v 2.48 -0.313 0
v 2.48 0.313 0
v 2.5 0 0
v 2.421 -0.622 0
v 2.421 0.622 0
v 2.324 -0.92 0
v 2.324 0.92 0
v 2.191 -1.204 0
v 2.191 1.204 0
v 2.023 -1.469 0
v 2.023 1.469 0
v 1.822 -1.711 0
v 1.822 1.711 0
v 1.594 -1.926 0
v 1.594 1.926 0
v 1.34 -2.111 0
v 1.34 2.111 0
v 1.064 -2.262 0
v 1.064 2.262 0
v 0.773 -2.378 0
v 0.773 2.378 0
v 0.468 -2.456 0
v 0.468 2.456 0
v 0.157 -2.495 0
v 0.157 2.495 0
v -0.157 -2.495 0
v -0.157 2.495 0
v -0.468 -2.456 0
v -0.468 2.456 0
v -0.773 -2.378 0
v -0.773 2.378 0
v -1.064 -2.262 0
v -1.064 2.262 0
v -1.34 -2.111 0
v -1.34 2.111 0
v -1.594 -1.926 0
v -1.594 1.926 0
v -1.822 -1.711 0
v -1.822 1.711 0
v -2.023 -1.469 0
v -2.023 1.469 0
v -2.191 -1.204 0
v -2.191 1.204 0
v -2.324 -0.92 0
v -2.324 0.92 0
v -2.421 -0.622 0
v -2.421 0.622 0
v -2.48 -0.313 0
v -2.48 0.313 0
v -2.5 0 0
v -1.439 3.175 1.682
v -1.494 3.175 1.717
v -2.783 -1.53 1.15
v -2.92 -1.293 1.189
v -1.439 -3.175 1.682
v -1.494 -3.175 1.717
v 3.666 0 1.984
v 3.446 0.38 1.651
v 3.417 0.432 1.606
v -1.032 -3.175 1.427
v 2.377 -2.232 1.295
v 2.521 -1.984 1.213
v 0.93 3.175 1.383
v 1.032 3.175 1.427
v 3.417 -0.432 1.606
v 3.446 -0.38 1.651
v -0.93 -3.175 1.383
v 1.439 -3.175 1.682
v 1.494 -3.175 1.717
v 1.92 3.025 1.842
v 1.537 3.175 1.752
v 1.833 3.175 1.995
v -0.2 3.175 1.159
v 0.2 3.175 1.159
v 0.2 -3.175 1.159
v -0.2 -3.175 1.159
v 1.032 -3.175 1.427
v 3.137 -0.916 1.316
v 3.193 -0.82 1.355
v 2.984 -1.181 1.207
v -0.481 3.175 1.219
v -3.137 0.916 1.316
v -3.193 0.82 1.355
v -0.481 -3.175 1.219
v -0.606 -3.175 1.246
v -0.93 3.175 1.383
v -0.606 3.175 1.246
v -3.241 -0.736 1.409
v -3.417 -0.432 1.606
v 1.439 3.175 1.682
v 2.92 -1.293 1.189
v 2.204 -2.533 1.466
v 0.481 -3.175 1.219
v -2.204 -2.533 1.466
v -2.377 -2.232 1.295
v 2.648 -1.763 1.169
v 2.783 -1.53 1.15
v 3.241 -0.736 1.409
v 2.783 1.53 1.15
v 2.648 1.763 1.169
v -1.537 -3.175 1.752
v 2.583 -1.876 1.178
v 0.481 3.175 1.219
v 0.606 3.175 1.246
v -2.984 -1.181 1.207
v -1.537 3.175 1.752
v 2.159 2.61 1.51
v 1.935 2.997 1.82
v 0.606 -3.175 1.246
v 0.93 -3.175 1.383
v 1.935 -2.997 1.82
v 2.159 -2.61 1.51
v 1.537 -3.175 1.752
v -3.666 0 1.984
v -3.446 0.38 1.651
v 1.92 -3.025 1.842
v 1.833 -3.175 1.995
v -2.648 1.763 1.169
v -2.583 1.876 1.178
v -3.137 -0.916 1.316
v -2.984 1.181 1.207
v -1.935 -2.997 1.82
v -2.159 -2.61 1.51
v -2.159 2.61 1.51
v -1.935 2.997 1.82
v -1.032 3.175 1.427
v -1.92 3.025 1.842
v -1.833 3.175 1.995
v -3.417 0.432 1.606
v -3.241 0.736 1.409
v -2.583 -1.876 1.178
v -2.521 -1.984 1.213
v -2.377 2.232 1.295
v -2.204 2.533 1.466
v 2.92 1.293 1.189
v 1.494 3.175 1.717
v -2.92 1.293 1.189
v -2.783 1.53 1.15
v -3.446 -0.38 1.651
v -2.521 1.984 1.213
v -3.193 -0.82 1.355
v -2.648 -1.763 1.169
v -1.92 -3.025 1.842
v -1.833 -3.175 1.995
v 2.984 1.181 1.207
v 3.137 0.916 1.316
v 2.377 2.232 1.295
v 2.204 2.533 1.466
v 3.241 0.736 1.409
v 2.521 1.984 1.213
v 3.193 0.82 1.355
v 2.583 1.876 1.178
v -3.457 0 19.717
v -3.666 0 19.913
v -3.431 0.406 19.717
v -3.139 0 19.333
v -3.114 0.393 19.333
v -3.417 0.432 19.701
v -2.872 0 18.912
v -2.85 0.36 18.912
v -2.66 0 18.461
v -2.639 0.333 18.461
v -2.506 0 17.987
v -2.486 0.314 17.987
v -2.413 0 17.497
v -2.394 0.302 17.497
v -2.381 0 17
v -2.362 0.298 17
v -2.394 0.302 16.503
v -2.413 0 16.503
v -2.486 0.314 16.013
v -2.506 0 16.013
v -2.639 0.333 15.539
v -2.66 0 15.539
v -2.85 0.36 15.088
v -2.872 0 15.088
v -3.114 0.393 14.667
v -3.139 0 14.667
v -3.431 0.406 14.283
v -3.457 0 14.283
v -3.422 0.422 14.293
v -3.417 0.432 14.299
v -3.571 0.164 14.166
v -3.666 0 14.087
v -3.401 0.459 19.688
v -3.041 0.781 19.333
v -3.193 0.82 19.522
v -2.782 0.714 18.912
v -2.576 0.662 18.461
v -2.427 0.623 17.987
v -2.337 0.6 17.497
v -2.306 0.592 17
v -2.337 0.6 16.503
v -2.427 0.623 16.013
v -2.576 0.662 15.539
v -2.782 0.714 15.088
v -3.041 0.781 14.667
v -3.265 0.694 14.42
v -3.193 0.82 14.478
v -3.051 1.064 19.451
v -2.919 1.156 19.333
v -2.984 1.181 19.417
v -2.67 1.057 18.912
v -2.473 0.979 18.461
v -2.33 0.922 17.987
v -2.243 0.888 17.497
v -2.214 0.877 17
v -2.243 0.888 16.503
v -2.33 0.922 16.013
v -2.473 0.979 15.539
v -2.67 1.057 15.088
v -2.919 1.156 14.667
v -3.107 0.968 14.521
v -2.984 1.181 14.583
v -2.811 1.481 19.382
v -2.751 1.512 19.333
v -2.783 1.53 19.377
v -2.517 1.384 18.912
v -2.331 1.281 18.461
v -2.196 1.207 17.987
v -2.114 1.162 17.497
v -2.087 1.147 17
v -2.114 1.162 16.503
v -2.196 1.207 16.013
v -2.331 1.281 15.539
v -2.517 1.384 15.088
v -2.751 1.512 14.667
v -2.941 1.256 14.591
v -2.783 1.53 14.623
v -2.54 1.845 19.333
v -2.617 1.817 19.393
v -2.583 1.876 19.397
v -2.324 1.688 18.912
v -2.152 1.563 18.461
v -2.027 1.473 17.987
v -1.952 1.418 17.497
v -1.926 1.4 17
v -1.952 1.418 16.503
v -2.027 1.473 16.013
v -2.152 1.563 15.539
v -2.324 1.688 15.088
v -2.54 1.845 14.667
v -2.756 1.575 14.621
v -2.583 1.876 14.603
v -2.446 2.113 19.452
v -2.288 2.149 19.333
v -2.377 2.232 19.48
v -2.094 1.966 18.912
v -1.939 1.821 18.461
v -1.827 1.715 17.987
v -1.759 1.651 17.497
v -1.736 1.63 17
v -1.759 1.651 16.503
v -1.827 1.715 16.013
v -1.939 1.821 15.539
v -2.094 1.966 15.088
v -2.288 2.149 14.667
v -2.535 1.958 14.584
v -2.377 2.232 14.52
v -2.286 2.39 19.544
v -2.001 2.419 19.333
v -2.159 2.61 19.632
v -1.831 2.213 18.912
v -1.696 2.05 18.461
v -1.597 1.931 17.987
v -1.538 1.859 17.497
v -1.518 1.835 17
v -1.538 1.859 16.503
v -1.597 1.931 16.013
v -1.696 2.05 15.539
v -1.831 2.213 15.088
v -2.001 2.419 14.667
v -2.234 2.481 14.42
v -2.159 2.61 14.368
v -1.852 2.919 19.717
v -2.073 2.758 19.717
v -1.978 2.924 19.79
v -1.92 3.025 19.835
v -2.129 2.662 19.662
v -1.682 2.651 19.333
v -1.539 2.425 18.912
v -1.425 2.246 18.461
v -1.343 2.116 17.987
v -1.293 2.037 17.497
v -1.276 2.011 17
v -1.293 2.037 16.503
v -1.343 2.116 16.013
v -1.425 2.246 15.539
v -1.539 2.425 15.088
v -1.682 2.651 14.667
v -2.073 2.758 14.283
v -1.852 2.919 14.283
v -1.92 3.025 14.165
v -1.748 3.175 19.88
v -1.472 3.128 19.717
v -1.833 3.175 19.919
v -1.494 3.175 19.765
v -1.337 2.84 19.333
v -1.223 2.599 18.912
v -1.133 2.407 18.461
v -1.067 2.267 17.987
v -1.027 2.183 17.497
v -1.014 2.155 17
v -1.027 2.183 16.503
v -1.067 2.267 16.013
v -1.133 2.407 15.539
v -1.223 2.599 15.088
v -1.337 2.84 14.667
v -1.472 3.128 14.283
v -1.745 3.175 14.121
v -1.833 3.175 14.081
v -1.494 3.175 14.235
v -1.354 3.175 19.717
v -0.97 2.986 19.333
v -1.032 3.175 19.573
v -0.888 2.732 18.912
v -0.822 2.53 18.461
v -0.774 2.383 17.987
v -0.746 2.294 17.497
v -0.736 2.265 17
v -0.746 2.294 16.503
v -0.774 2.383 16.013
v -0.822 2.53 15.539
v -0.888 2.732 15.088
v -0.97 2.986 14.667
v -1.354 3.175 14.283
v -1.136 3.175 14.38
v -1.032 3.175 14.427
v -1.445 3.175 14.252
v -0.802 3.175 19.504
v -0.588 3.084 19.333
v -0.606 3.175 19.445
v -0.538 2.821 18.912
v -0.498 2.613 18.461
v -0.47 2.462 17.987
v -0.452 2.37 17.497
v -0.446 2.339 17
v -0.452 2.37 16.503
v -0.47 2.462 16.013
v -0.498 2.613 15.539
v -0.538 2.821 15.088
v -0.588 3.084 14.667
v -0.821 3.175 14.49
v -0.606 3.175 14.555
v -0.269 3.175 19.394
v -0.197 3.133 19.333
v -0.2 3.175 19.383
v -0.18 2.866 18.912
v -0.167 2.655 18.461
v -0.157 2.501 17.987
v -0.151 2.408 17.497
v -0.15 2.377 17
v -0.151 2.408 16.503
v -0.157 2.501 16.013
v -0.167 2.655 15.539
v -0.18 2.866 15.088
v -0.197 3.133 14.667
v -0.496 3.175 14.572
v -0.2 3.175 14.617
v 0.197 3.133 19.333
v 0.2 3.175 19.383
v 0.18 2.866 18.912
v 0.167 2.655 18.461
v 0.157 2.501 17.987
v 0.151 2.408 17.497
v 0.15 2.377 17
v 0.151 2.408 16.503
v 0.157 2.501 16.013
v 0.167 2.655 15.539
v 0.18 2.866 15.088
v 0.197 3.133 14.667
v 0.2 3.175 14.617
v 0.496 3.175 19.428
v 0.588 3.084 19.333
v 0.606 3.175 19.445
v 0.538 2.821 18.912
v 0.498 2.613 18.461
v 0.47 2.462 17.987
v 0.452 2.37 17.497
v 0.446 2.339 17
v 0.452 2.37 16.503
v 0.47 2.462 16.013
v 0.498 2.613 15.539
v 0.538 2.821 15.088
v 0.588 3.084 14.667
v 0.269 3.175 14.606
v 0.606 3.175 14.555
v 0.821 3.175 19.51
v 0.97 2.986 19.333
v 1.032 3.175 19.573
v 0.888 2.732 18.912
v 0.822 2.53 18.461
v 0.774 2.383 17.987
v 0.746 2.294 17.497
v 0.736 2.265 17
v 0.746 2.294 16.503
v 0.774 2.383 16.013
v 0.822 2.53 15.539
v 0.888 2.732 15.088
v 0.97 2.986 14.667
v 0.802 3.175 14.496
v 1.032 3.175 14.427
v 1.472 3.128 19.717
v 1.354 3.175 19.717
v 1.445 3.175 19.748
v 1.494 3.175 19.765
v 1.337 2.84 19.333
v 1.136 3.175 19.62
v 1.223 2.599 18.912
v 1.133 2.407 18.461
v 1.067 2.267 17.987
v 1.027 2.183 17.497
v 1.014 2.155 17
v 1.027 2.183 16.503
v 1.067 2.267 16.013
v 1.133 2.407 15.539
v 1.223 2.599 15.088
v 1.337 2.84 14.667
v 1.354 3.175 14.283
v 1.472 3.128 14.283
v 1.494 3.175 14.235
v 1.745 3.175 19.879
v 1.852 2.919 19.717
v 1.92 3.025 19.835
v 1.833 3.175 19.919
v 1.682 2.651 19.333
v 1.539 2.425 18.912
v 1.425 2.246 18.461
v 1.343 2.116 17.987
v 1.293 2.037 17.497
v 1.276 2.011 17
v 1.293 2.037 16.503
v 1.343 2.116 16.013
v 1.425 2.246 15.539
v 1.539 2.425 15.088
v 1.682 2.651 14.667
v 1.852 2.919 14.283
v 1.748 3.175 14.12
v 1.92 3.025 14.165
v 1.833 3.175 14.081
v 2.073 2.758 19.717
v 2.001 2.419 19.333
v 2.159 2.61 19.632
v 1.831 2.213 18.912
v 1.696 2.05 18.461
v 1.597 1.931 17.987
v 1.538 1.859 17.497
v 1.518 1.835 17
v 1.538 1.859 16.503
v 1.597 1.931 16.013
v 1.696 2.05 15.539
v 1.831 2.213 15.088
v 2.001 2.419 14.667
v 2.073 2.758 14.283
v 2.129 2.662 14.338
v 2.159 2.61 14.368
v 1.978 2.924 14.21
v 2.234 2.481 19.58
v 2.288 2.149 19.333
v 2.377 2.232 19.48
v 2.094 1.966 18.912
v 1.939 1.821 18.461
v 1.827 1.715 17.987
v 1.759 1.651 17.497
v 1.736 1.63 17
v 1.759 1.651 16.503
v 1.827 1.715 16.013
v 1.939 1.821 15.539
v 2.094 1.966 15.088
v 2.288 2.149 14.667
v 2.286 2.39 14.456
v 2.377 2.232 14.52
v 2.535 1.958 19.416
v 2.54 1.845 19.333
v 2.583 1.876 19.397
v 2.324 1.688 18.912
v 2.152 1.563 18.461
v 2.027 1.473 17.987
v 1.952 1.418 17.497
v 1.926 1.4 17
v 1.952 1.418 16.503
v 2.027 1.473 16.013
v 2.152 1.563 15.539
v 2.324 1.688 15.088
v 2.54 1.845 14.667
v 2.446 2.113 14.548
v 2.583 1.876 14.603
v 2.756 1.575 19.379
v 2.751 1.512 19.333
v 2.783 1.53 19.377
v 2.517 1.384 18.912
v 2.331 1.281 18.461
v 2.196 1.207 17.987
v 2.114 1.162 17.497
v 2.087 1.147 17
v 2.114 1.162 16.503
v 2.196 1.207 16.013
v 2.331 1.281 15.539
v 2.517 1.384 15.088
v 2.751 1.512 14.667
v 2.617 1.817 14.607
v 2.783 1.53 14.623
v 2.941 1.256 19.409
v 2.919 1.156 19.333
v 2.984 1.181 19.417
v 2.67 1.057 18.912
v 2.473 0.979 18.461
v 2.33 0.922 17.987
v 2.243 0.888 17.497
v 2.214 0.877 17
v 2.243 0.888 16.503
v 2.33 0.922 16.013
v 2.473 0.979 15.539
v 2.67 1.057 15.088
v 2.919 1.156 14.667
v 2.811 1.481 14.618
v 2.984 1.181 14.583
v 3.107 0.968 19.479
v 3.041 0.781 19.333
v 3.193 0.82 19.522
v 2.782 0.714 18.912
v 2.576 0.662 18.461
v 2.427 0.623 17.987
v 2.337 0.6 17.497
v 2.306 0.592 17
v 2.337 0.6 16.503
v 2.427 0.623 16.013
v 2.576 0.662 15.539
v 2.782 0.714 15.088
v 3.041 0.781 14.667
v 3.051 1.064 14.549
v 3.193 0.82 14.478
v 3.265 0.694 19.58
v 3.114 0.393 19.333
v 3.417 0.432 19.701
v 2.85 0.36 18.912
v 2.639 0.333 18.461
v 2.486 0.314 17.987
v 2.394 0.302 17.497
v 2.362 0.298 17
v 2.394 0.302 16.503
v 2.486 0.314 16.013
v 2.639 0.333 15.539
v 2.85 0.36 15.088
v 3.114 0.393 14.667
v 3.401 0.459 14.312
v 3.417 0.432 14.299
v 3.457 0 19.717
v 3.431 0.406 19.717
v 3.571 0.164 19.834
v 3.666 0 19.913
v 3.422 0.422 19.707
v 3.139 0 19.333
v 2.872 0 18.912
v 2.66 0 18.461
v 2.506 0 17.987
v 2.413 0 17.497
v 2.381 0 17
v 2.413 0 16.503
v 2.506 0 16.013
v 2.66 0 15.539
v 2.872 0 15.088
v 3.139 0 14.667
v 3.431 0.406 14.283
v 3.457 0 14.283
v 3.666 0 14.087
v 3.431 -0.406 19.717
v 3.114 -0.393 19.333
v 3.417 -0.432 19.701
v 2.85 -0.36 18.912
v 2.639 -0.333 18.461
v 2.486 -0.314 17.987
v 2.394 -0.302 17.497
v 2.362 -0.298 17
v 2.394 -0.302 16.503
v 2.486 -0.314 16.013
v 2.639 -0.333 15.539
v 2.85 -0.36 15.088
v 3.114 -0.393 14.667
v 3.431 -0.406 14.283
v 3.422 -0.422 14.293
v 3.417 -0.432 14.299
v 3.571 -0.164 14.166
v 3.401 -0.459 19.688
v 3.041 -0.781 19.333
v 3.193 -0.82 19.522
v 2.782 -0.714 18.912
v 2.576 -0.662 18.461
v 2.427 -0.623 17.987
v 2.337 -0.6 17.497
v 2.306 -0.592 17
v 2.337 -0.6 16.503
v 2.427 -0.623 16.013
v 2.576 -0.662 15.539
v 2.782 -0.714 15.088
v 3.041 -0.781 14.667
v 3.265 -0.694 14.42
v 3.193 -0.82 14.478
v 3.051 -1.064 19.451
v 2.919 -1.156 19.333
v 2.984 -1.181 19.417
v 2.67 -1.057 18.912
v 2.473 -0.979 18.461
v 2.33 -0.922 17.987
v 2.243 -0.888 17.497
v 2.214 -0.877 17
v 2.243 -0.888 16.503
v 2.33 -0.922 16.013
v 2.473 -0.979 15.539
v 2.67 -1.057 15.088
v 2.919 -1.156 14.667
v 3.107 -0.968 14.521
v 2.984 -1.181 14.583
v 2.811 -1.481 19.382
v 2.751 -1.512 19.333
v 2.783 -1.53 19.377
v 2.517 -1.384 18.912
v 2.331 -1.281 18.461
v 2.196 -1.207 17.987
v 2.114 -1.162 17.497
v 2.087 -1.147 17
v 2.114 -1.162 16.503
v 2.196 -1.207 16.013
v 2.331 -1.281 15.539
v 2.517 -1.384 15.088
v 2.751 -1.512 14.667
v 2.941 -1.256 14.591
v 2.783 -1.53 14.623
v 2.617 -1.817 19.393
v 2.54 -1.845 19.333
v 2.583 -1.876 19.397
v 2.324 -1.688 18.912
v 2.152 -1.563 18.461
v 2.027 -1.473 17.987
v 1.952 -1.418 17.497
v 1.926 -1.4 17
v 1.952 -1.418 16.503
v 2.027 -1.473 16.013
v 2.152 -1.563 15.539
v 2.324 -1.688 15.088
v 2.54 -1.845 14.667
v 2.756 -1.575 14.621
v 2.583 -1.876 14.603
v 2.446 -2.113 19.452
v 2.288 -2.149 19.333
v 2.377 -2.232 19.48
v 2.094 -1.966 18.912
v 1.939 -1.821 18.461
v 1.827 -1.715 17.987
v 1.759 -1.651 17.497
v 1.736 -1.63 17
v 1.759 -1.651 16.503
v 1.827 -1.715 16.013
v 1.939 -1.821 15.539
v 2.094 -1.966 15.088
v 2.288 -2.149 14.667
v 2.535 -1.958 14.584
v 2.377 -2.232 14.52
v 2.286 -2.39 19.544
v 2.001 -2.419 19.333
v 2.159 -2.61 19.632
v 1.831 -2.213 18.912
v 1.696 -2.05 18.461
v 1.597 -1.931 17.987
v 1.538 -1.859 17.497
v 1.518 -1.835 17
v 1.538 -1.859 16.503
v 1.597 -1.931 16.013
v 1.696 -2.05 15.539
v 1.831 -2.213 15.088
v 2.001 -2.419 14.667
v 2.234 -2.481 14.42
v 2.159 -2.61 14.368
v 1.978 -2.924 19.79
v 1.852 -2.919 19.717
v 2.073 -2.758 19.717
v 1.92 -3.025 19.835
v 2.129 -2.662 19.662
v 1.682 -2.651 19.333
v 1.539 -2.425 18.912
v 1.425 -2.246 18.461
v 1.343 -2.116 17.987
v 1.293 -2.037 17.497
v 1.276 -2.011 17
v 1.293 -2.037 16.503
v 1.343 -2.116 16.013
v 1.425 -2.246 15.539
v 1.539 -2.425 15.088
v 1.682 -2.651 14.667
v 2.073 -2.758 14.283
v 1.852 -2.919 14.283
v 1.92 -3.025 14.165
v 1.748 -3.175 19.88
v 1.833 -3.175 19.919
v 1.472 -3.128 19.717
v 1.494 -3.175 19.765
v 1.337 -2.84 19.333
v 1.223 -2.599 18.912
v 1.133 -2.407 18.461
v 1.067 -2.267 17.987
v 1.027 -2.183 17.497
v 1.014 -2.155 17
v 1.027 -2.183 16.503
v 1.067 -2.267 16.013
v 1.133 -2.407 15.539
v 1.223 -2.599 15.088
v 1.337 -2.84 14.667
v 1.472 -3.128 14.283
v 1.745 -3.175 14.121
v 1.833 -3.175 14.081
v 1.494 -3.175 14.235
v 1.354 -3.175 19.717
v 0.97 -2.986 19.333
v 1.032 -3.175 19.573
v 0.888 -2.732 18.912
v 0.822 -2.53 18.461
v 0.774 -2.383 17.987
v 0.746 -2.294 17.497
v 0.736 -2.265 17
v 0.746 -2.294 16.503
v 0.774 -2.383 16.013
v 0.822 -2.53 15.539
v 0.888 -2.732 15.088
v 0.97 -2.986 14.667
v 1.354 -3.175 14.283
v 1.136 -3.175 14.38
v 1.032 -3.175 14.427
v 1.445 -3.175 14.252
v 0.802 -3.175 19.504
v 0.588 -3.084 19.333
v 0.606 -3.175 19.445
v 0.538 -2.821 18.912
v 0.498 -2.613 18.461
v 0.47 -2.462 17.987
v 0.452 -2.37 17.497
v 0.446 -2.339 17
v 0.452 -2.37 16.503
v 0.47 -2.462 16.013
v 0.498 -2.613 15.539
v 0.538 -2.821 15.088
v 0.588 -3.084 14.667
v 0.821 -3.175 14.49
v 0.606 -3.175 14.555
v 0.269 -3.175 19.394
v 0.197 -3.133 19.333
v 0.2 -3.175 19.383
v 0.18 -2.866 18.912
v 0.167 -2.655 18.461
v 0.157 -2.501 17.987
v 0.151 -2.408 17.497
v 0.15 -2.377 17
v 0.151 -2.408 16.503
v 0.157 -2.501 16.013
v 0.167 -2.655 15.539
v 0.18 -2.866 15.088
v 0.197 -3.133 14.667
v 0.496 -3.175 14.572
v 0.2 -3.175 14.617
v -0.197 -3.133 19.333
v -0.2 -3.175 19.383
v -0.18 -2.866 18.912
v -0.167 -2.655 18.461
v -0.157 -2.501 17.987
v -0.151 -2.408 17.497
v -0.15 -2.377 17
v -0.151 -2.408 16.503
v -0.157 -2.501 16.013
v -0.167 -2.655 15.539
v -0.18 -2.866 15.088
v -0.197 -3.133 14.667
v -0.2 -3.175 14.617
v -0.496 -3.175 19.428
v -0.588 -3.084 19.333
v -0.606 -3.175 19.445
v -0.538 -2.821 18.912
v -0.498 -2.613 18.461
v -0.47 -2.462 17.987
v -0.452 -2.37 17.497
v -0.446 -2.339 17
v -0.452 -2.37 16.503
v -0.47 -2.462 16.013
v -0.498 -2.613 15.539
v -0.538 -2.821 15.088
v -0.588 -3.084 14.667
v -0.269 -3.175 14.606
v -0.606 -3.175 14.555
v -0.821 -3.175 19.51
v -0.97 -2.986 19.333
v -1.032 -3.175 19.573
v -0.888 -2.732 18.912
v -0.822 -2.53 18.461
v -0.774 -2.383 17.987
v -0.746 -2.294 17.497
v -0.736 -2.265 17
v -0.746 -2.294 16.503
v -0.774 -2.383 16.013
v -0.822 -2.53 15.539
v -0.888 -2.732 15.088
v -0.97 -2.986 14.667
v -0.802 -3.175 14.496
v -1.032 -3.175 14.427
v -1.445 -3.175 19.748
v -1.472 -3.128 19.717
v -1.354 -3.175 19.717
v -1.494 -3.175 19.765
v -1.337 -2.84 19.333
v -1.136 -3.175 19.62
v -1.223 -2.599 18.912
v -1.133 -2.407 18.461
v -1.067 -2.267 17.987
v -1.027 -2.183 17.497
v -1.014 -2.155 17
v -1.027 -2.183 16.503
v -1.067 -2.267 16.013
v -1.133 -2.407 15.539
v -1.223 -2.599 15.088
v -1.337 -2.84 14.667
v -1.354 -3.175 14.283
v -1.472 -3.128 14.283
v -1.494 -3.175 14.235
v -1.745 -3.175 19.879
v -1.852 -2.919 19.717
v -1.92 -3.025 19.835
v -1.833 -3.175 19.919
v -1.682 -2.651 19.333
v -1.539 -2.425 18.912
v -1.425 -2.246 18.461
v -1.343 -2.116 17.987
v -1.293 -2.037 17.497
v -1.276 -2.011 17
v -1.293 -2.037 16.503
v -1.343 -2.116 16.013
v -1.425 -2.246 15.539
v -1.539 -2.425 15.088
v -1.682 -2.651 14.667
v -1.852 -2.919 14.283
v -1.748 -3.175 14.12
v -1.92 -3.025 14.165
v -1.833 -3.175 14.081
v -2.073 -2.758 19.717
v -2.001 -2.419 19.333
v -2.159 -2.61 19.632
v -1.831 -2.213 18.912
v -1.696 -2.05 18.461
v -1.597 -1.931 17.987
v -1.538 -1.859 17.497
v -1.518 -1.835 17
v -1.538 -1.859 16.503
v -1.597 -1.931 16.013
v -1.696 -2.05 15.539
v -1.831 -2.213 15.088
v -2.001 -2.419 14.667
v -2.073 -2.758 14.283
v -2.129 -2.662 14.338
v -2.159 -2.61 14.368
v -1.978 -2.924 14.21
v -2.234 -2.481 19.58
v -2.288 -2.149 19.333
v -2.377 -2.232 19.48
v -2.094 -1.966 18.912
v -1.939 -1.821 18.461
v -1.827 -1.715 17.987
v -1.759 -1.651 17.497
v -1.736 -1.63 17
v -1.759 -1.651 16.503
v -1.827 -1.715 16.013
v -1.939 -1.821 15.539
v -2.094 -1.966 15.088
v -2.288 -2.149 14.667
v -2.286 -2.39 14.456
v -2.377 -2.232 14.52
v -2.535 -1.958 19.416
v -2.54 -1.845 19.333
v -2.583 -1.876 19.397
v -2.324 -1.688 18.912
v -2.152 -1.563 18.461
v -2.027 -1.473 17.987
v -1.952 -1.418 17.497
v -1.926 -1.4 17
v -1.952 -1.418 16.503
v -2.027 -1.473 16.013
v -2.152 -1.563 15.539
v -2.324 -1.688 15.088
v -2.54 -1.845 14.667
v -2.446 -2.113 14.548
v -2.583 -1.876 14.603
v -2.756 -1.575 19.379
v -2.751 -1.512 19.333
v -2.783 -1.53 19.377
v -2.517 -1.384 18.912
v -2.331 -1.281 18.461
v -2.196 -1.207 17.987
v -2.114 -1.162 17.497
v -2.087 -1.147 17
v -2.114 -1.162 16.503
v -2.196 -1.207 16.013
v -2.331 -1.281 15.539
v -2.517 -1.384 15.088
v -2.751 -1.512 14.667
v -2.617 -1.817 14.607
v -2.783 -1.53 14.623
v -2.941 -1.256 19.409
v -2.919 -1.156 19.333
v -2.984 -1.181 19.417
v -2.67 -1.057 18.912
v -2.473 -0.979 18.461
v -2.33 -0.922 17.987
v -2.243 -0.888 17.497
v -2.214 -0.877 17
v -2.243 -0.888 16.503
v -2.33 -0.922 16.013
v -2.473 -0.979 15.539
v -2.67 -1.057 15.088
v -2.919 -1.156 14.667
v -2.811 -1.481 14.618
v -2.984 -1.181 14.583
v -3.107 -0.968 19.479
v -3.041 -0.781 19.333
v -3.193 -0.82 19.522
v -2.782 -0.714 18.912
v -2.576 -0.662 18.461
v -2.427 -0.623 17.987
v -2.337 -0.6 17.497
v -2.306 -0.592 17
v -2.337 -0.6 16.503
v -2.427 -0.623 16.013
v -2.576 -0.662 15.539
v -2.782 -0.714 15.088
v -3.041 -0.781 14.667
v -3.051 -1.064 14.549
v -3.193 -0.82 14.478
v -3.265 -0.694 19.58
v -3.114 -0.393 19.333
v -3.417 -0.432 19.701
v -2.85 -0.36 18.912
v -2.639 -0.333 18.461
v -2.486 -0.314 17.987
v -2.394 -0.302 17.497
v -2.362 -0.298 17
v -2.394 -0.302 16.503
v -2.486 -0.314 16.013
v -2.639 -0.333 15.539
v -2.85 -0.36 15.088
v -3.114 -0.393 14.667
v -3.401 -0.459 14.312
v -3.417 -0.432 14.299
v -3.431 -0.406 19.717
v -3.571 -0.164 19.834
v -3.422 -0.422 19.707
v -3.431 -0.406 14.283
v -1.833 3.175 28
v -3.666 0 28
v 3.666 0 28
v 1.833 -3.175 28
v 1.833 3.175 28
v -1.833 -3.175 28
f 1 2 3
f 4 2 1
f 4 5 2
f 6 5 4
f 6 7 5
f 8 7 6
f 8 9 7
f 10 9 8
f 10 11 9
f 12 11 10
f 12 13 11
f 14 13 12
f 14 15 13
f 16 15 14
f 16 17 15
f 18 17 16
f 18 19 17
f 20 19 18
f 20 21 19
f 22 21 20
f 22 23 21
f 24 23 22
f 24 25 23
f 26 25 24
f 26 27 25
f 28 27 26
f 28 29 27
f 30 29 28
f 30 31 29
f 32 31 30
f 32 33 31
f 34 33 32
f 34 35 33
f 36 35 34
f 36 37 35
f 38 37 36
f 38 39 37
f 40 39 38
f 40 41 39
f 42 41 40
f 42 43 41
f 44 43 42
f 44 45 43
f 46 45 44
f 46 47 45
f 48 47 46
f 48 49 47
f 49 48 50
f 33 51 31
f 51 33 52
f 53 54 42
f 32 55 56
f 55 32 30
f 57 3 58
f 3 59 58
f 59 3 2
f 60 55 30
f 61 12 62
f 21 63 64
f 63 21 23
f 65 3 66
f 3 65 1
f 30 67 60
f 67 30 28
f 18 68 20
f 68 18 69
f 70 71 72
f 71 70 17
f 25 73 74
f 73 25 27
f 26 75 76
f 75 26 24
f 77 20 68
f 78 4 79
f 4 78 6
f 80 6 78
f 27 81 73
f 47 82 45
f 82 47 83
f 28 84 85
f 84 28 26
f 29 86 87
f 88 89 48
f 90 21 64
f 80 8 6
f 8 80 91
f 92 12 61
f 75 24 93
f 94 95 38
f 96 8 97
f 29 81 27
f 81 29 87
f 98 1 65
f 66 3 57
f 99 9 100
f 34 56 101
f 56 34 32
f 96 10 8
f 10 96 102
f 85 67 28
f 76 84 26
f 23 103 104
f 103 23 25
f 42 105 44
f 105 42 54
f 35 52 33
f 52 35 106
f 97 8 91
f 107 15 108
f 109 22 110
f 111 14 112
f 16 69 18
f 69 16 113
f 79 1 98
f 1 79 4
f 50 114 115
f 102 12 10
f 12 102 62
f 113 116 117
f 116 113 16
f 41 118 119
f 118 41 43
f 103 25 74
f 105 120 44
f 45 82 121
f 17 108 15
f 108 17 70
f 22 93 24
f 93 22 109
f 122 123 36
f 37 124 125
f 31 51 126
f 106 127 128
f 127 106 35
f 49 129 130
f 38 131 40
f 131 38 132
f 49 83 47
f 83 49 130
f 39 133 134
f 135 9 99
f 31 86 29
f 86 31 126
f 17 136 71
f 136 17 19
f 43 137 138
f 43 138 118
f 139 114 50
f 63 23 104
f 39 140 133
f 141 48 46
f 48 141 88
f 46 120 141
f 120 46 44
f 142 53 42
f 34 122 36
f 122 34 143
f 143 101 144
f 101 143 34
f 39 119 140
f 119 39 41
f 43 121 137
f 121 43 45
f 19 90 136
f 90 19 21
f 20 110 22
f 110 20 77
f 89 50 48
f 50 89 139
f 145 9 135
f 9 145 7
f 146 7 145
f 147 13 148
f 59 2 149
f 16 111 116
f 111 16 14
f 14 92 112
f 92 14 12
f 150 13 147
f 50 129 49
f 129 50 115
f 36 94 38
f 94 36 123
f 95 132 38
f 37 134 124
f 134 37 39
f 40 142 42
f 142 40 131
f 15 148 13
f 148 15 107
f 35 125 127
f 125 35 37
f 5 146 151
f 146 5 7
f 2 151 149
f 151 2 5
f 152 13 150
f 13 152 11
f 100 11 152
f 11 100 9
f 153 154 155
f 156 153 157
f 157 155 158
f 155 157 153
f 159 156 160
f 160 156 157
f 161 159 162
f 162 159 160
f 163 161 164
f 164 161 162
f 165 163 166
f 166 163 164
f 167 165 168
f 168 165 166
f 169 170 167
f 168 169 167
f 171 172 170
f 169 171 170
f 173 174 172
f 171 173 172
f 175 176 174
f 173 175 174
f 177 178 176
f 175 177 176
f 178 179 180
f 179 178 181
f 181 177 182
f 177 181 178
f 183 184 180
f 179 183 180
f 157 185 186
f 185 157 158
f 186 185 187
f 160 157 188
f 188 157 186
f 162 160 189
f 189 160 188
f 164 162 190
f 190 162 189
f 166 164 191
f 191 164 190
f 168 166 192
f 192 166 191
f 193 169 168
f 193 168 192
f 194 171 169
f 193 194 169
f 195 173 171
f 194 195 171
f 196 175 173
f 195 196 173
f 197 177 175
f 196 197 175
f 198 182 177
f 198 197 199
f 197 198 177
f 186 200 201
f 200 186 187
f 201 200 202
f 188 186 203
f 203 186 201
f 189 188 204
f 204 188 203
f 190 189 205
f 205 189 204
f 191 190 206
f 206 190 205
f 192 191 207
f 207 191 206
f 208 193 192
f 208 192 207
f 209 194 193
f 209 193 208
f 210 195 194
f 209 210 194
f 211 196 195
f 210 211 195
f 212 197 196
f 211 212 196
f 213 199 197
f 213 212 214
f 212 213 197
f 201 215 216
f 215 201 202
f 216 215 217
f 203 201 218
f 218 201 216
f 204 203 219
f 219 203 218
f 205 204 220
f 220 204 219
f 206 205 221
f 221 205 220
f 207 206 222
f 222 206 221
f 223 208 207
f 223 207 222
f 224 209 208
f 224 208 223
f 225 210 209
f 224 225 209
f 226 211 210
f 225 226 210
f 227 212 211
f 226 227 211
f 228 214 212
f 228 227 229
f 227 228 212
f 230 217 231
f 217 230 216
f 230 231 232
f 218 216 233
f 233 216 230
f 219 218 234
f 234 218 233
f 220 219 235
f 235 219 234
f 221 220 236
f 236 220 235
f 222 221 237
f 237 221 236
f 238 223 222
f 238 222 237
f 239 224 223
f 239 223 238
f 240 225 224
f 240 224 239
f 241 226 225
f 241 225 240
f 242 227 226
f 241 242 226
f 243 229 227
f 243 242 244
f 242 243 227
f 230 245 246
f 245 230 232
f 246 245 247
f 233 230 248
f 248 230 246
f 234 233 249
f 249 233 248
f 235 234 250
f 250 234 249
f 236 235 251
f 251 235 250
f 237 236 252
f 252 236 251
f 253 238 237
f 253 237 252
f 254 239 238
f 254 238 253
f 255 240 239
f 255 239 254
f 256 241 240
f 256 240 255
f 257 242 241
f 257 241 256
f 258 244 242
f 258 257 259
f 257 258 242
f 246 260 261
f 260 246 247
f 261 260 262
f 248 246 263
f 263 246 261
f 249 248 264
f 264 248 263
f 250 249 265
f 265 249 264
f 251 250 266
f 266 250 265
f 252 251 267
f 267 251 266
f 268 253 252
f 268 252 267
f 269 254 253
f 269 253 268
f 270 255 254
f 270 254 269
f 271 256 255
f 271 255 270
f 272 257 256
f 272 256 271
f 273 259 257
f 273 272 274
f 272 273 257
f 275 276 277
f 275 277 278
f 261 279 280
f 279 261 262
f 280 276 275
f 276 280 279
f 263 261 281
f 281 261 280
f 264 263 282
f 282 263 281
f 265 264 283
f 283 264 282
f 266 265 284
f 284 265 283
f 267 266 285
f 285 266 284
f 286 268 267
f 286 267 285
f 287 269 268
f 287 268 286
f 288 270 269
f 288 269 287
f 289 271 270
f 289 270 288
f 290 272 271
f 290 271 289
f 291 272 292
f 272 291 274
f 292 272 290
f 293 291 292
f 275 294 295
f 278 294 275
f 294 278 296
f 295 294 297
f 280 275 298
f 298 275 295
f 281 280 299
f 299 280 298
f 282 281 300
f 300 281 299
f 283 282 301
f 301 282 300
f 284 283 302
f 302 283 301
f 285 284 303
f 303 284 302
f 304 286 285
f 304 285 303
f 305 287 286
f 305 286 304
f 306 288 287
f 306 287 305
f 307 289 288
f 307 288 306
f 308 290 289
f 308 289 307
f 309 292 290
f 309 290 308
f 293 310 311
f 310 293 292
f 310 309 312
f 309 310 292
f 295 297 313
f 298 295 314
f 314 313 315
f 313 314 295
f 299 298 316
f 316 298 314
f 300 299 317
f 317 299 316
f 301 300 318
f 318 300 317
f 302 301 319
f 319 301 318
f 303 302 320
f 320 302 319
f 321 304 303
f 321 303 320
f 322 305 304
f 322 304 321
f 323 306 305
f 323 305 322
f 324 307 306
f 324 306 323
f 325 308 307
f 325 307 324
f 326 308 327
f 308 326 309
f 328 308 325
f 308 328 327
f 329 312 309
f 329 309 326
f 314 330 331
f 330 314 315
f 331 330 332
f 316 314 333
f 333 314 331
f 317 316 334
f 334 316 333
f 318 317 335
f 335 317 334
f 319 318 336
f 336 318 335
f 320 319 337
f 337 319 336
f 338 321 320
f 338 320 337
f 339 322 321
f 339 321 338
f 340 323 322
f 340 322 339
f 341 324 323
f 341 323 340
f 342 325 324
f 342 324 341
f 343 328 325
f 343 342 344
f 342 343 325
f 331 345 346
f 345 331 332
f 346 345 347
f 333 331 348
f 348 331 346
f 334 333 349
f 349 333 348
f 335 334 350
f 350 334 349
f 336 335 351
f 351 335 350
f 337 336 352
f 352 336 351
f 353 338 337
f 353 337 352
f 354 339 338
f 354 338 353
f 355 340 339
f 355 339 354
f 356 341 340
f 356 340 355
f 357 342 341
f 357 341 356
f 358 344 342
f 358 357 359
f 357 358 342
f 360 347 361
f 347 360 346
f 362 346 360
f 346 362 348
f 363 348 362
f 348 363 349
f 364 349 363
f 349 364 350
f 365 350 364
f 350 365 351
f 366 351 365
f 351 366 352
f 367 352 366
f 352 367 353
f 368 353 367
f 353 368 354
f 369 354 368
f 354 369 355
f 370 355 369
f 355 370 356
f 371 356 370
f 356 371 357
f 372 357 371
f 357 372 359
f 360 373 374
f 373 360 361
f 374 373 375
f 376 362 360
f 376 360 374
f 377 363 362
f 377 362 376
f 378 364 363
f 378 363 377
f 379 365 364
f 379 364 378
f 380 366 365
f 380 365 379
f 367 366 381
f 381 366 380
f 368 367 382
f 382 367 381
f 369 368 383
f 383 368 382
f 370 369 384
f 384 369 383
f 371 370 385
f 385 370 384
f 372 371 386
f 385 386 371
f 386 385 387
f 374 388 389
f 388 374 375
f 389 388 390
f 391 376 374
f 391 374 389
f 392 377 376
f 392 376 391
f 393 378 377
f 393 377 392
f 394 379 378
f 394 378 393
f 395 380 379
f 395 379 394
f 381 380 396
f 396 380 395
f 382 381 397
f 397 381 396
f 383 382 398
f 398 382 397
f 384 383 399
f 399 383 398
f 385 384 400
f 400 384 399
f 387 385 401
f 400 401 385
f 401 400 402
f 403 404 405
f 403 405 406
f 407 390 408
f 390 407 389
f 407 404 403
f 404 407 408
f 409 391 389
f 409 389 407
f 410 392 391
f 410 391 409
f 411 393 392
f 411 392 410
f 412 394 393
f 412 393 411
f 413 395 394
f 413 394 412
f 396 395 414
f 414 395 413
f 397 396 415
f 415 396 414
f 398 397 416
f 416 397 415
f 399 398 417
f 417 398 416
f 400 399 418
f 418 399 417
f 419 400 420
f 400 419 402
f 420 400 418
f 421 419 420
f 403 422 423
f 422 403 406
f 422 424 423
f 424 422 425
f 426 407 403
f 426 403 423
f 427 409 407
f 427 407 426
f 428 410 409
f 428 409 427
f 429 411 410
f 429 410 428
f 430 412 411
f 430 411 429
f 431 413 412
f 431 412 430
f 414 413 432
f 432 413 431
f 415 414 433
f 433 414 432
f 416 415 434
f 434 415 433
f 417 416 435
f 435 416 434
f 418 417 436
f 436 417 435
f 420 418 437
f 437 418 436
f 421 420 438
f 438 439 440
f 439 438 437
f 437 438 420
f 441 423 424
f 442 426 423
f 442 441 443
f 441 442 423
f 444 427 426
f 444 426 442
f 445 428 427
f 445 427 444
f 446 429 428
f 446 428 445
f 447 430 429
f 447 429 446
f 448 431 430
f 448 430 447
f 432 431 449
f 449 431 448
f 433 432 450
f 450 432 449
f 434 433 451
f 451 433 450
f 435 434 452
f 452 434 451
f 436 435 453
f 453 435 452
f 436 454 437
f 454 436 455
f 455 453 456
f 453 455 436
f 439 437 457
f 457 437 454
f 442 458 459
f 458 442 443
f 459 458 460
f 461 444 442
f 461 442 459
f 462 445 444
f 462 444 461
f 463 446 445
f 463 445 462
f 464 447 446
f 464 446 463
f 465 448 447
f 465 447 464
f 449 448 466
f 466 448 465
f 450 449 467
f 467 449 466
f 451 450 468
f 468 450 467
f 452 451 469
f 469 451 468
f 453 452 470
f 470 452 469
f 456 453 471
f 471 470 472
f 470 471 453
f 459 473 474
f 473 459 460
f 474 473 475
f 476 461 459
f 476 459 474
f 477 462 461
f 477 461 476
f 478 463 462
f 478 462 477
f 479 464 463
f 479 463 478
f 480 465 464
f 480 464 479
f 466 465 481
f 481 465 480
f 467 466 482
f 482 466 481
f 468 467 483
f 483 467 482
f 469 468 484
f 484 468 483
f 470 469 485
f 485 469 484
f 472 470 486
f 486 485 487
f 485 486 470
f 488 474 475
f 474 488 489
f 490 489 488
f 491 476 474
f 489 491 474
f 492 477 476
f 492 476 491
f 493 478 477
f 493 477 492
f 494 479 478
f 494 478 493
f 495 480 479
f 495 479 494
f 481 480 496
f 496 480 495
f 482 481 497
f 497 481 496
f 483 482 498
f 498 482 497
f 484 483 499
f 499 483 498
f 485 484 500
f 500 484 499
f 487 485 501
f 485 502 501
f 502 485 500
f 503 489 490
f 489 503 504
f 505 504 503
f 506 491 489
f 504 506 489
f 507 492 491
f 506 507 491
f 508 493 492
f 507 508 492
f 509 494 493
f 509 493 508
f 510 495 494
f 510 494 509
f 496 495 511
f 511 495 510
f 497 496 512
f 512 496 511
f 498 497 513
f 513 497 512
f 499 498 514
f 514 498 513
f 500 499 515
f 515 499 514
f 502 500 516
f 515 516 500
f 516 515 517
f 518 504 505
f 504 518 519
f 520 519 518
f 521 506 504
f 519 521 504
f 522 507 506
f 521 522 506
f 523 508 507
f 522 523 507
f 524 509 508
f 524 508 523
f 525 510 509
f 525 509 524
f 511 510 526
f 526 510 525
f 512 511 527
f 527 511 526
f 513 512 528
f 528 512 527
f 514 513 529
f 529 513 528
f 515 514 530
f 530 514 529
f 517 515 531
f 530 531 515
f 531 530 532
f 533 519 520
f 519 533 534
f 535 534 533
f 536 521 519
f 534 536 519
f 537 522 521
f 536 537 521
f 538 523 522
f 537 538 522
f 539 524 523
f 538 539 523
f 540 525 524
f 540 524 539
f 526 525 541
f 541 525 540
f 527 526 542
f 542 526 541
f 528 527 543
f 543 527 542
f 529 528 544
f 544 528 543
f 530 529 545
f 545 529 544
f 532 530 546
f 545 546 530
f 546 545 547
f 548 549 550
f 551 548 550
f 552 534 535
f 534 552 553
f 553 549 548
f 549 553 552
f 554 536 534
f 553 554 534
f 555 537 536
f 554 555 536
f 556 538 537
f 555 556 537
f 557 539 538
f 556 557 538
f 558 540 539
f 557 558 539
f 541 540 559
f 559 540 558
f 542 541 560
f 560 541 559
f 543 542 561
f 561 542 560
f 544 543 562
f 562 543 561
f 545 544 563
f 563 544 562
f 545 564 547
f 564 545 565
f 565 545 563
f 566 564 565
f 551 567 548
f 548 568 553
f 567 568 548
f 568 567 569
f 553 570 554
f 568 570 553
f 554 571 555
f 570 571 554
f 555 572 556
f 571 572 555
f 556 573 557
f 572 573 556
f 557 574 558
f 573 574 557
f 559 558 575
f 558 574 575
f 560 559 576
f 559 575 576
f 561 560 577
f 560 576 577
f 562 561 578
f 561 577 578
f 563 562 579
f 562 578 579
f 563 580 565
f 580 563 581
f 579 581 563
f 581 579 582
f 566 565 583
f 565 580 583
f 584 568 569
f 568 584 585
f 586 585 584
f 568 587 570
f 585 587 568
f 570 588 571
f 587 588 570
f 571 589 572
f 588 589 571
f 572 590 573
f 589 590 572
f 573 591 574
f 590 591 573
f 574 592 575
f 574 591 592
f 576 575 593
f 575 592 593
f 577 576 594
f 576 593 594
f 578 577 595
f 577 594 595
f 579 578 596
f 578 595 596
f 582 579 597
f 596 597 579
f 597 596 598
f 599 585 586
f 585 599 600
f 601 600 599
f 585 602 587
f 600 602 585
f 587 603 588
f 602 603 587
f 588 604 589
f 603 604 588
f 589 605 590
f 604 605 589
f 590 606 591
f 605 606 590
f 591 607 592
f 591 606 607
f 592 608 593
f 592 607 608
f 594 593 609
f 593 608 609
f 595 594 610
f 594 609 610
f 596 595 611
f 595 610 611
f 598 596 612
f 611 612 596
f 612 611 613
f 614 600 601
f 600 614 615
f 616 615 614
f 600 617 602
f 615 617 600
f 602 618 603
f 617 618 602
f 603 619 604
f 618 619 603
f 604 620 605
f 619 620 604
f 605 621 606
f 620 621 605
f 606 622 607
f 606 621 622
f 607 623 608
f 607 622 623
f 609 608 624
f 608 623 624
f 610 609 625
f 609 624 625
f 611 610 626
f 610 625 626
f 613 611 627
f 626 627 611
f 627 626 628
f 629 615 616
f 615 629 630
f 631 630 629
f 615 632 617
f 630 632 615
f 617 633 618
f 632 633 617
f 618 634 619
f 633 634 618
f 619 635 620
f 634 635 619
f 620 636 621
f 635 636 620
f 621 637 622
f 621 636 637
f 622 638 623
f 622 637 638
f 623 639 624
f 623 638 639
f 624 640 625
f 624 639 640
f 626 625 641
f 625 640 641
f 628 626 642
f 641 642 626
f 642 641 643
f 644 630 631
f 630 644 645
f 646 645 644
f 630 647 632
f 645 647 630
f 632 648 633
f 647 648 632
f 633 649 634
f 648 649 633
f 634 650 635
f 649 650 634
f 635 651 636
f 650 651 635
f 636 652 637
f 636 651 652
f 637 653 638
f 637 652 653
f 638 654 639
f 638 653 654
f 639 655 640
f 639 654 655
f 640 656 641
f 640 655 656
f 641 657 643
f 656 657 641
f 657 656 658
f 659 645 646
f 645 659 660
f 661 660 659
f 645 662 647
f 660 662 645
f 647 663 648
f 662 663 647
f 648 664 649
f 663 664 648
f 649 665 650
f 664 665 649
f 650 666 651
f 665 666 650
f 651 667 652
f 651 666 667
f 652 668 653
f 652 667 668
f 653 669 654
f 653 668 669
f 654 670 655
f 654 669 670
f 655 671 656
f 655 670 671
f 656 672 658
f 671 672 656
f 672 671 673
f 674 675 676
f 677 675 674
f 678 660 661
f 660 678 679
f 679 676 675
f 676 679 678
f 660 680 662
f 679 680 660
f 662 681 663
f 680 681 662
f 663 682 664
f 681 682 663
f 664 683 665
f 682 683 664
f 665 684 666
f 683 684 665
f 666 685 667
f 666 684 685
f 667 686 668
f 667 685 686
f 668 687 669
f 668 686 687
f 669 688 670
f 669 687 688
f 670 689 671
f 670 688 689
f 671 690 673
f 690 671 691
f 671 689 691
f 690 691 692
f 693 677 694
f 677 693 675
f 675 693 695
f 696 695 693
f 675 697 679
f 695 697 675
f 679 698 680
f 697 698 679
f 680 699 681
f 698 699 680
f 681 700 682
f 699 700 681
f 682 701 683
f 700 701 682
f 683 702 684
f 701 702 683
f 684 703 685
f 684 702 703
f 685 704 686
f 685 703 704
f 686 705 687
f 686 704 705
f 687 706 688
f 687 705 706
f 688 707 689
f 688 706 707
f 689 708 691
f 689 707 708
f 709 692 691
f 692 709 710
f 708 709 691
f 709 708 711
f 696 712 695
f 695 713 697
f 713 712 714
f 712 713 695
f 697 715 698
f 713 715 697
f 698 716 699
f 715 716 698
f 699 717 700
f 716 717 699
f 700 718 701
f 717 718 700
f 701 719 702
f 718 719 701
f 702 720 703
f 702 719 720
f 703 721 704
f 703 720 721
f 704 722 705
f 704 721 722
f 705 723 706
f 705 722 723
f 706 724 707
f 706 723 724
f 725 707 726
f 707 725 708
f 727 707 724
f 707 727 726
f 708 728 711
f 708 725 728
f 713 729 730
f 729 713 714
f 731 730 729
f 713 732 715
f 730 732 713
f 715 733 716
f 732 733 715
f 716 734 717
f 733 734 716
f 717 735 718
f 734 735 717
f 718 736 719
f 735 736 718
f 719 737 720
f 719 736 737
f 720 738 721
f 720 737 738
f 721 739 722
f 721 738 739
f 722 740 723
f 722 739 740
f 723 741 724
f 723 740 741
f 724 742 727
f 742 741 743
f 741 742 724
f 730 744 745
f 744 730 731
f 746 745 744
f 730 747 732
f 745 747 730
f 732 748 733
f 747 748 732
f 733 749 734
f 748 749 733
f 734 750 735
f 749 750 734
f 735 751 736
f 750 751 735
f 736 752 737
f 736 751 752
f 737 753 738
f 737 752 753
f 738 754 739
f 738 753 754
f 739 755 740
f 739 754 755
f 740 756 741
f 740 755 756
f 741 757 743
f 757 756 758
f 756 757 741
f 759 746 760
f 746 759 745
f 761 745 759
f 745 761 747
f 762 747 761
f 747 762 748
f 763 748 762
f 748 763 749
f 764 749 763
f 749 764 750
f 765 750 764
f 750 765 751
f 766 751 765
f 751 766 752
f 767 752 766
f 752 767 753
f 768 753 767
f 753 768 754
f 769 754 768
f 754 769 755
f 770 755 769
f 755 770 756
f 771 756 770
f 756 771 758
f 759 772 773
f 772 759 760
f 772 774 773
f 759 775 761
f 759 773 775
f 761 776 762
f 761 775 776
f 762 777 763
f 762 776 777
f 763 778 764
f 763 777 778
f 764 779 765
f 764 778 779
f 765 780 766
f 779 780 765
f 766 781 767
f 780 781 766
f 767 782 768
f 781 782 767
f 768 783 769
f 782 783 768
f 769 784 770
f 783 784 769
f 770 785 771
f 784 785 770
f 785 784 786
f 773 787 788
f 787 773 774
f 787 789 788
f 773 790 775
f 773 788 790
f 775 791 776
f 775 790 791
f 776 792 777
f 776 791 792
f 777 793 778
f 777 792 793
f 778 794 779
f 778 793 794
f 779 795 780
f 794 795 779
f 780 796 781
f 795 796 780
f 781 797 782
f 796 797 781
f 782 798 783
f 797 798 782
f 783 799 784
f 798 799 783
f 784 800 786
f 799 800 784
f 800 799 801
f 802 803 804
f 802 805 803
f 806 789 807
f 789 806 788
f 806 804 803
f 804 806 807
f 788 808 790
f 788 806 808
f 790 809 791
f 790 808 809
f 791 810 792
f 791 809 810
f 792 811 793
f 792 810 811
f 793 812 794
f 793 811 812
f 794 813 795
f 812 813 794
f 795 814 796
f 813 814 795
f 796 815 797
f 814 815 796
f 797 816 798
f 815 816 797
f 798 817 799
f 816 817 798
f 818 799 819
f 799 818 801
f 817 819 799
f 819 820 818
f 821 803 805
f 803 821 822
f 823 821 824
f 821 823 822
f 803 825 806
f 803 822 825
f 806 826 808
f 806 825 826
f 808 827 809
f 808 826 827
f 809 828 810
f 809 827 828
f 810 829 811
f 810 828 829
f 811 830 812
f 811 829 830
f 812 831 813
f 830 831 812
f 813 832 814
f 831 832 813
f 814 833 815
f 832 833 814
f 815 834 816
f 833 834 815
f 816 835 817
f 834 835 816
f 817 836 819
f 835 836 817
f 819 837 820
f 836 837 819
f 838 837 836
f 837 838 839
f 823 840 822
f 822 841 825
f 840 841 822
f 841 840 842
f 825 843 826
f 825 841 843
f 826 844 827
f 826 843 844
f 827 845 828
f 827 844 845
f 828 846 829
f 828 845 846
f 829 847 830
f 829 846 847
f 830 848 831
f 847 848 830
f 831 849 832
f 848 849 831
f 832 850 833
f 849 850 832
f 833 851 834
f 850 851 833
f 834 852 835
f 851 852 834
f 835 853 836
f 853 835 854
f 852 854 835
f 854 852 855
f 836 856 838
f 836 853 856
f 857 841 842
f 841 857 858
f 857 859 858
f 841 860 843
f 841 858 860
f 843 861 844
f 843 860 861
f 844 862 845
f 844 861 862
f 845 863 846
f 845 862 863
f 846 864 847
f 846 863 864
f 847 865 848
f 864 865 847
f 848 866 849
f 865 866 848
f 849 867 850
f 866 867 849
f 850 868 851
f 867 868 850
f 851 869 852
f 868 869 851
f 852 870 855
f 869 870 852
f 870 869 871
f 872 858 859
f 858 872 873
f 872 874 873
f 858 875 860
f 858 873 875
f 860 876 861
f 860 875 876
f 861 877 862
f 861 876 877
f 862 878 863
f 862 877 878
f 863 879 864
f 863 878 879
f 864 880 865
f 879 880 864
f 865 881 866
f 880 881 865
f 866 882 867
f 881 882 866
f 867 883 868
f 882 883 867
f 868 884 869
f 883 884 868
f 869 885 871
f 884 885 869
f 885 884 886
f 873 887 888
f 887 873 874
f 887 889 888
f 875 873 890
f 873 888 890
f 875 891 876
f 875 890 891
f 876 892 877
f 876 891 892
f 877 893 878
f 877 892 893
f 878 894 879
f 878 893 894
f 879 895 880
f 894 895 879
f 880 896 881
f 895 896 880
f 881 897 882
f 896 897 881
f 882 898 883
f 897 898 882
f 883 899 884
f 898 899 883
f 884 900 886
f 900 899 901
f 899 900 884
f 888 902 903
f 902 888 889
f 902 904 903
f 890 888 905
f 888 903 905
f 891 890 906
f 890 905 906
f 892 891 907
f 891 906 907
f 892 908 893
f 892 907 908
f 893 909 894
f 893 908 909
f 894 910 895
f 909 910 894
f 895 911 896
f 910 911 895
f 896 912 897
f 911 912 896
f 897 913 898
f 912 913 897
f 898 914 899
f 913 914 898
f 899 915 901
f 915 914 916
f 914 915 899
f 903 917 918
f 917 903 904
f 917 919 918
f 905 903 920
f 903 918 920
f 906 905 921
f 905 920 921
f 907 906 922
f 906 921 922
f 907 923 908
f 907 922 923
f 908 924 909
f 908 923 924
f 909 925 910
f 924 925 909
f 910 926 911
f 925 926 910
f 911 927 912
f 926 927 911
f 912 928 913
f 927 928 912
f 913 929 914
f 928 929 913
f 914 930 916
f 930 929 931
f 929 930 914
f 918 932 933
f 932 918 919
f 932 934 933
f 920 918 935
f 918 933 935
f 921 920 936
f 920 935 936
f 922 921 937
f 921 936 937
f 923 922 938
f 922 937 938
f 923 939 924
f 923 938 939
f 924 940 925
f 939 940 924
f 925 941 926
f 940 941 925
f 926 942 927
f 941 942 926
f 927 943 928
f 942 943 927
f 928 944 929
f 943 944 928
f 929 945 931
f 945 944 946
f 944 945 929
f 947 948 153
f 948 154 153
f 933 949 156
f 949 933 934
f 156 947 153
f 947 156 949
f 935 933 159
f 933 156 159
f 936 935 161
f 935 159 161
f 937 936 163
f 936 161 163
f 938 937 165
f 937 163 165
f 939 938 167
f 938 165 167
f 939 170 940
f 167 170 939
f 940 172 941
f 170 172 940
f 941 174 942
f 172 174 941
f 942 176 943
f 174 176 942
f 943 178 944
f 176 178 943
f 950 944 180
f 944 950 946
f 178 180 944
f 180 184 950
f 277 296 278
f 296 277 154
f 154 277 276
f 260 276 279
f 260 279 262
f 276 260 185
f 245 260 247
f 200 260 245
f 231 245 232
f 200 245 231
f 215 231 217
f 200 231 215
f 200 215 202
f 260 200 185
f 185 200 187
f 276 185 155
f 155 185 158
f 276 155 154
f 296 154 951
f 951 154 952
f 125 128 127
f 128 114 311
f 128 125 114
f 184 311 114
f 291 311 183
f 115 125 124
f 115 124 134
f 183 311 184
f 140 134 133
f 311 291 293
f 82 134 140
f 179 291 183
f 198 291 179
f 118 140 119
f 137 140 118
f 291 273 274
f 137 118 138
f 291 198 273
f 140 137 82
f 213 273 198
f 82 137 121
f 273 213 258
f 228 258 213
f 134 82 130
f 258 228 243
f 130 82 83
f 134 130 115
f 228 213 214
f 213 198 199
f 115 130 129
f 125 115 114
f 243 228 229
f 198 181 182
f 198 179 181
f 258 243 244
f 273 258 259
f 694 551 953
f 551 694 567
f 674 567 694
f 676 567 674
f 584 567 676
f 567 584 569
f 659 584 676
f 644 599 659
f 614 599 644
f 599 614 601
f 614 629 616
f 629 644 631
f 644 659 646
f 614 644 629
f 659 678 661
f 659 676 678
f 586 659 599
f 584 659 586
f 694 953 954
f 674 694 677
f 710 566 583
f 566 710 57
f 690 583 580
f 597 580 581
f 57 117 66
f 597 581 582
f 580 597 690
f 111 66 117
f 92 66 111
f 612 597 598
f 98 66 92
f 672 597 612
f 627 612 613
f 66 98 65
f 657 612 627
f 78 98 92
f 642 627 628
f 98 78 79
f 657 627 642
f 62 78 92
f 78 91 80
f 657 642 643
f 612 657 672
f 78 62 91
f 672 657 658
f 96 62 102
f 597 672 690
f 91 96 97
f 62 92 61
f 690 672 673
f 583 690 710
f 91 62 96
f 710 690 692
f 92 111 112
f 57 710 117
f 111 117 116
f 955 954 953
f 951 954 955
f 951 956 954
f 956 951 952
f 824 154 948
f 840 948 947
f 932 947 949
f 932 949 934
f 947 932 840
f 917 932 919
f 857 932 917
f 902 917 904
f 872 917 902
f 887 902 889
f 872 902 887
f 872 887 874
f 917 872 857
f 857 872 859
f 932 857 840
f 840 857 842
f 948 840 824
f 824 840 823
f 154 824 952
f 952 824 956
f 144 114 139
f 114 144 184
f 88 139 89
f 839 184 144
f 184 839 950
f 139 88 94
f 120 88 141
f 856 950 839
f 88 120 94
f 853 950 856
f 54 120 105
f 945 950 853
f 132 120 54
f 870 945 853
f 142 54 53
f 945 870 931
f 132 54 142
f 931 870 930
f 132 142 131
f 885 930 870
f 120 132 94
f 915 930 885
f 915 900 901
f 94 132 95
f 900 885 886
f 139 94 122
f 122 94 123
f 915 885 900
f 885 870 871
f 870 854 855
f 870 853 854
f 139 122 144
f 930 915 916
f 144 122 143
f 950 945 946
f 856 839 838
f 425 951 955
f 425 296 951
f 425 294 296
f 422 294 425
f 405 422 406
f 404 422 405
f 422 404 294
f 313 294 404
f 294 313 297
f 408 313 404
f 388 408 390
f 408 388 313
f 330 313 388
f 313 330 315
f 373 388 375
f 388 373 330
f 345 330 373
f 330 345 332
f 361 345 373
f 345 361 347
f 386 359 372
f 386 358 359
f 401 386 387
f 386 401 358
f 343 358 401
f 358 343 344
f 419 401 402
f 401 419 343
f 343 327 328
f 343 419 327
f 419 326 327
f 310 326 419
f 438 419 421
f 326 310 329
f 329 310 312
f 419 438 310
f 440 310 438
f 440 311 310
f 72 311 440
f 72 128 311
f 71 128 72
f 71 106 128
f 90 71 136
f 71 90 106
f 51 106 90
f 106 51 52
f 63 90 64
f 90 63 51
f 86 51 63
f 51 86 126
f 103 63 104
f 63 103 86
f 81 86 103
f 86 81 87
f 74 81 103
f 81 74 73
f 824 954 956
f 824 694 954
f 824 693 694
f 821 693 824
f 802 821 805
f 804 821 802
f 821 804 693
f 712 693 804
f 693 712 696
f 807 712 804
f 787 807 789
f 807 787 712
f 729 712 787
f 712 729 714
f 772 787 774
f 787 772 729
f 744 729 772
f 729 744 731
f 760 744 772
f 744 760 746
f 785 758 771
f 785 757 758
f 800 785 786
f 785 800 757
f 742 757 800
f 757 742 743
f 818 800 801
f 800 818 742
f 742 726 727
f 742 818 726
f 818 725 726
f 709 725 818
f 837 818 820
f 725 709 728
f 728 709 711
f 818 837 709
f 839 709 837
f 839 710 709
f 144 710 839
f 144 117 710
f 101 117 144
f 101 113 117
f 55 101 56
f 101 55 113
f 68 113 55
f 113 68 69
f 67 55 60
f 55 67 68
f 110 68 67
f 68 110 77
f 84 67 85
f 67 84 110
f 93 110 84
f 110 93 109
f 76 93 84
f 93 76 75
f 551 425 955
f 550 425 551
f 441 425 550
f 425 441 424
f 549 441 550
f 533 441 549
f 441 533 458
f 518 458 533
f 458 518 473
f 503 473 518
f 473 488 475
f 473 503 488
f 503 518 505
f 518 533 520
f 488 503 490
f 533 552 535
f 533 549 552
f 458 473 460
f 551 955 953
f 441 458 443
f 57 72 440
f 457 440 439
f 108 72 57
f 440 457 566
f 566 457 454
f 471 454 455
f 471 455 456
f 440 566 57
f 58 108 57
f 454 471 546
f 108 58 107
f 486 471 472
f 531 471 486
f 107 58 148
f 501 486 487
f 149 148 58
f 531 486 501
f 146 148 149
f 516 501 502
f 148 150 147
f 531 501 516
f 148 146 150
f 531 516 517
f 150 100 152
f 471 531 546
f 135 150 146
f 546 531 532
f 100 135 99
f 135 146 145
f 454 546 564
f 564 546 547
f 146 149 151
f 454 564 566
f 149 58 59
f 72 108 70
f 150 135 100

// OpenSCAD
$fn = 50;


difference() {
	union() {
		translate(v = [0, 0, 0]) {
			rotate(a = [0, 0, 0]) {
				difference() {
					union() {
						linear_extrude(height = 28) {
							polygon(points = [[3.6658550000, 0.0000000000], [1.8329275000, 3.1747235566], [-1.8329275000, 3.1747235566], [-3.6658550000, 0.0000000000], [-1.8329275000, -3.1747235566], [1.8329275000, -3.1747235566]]);
						}
					}
					union() {
						translate(v = [0, 0, 17]) {
							rotate_extrude(angle = 360) {
								translate(v = [6.3500000000, 0, 0]) {
									circle(r = 3.9687500000);
								}
							}
						}
						difference() {
							cylinder(h = 2, r1 = 10.5000000000, r2 = 11.6750000000);
							cylinder(h = 2, r1 = 2.5000000000, r2 = 3.6750000000);
						}
					}
				}
			}
		}
	}
	union();
}
